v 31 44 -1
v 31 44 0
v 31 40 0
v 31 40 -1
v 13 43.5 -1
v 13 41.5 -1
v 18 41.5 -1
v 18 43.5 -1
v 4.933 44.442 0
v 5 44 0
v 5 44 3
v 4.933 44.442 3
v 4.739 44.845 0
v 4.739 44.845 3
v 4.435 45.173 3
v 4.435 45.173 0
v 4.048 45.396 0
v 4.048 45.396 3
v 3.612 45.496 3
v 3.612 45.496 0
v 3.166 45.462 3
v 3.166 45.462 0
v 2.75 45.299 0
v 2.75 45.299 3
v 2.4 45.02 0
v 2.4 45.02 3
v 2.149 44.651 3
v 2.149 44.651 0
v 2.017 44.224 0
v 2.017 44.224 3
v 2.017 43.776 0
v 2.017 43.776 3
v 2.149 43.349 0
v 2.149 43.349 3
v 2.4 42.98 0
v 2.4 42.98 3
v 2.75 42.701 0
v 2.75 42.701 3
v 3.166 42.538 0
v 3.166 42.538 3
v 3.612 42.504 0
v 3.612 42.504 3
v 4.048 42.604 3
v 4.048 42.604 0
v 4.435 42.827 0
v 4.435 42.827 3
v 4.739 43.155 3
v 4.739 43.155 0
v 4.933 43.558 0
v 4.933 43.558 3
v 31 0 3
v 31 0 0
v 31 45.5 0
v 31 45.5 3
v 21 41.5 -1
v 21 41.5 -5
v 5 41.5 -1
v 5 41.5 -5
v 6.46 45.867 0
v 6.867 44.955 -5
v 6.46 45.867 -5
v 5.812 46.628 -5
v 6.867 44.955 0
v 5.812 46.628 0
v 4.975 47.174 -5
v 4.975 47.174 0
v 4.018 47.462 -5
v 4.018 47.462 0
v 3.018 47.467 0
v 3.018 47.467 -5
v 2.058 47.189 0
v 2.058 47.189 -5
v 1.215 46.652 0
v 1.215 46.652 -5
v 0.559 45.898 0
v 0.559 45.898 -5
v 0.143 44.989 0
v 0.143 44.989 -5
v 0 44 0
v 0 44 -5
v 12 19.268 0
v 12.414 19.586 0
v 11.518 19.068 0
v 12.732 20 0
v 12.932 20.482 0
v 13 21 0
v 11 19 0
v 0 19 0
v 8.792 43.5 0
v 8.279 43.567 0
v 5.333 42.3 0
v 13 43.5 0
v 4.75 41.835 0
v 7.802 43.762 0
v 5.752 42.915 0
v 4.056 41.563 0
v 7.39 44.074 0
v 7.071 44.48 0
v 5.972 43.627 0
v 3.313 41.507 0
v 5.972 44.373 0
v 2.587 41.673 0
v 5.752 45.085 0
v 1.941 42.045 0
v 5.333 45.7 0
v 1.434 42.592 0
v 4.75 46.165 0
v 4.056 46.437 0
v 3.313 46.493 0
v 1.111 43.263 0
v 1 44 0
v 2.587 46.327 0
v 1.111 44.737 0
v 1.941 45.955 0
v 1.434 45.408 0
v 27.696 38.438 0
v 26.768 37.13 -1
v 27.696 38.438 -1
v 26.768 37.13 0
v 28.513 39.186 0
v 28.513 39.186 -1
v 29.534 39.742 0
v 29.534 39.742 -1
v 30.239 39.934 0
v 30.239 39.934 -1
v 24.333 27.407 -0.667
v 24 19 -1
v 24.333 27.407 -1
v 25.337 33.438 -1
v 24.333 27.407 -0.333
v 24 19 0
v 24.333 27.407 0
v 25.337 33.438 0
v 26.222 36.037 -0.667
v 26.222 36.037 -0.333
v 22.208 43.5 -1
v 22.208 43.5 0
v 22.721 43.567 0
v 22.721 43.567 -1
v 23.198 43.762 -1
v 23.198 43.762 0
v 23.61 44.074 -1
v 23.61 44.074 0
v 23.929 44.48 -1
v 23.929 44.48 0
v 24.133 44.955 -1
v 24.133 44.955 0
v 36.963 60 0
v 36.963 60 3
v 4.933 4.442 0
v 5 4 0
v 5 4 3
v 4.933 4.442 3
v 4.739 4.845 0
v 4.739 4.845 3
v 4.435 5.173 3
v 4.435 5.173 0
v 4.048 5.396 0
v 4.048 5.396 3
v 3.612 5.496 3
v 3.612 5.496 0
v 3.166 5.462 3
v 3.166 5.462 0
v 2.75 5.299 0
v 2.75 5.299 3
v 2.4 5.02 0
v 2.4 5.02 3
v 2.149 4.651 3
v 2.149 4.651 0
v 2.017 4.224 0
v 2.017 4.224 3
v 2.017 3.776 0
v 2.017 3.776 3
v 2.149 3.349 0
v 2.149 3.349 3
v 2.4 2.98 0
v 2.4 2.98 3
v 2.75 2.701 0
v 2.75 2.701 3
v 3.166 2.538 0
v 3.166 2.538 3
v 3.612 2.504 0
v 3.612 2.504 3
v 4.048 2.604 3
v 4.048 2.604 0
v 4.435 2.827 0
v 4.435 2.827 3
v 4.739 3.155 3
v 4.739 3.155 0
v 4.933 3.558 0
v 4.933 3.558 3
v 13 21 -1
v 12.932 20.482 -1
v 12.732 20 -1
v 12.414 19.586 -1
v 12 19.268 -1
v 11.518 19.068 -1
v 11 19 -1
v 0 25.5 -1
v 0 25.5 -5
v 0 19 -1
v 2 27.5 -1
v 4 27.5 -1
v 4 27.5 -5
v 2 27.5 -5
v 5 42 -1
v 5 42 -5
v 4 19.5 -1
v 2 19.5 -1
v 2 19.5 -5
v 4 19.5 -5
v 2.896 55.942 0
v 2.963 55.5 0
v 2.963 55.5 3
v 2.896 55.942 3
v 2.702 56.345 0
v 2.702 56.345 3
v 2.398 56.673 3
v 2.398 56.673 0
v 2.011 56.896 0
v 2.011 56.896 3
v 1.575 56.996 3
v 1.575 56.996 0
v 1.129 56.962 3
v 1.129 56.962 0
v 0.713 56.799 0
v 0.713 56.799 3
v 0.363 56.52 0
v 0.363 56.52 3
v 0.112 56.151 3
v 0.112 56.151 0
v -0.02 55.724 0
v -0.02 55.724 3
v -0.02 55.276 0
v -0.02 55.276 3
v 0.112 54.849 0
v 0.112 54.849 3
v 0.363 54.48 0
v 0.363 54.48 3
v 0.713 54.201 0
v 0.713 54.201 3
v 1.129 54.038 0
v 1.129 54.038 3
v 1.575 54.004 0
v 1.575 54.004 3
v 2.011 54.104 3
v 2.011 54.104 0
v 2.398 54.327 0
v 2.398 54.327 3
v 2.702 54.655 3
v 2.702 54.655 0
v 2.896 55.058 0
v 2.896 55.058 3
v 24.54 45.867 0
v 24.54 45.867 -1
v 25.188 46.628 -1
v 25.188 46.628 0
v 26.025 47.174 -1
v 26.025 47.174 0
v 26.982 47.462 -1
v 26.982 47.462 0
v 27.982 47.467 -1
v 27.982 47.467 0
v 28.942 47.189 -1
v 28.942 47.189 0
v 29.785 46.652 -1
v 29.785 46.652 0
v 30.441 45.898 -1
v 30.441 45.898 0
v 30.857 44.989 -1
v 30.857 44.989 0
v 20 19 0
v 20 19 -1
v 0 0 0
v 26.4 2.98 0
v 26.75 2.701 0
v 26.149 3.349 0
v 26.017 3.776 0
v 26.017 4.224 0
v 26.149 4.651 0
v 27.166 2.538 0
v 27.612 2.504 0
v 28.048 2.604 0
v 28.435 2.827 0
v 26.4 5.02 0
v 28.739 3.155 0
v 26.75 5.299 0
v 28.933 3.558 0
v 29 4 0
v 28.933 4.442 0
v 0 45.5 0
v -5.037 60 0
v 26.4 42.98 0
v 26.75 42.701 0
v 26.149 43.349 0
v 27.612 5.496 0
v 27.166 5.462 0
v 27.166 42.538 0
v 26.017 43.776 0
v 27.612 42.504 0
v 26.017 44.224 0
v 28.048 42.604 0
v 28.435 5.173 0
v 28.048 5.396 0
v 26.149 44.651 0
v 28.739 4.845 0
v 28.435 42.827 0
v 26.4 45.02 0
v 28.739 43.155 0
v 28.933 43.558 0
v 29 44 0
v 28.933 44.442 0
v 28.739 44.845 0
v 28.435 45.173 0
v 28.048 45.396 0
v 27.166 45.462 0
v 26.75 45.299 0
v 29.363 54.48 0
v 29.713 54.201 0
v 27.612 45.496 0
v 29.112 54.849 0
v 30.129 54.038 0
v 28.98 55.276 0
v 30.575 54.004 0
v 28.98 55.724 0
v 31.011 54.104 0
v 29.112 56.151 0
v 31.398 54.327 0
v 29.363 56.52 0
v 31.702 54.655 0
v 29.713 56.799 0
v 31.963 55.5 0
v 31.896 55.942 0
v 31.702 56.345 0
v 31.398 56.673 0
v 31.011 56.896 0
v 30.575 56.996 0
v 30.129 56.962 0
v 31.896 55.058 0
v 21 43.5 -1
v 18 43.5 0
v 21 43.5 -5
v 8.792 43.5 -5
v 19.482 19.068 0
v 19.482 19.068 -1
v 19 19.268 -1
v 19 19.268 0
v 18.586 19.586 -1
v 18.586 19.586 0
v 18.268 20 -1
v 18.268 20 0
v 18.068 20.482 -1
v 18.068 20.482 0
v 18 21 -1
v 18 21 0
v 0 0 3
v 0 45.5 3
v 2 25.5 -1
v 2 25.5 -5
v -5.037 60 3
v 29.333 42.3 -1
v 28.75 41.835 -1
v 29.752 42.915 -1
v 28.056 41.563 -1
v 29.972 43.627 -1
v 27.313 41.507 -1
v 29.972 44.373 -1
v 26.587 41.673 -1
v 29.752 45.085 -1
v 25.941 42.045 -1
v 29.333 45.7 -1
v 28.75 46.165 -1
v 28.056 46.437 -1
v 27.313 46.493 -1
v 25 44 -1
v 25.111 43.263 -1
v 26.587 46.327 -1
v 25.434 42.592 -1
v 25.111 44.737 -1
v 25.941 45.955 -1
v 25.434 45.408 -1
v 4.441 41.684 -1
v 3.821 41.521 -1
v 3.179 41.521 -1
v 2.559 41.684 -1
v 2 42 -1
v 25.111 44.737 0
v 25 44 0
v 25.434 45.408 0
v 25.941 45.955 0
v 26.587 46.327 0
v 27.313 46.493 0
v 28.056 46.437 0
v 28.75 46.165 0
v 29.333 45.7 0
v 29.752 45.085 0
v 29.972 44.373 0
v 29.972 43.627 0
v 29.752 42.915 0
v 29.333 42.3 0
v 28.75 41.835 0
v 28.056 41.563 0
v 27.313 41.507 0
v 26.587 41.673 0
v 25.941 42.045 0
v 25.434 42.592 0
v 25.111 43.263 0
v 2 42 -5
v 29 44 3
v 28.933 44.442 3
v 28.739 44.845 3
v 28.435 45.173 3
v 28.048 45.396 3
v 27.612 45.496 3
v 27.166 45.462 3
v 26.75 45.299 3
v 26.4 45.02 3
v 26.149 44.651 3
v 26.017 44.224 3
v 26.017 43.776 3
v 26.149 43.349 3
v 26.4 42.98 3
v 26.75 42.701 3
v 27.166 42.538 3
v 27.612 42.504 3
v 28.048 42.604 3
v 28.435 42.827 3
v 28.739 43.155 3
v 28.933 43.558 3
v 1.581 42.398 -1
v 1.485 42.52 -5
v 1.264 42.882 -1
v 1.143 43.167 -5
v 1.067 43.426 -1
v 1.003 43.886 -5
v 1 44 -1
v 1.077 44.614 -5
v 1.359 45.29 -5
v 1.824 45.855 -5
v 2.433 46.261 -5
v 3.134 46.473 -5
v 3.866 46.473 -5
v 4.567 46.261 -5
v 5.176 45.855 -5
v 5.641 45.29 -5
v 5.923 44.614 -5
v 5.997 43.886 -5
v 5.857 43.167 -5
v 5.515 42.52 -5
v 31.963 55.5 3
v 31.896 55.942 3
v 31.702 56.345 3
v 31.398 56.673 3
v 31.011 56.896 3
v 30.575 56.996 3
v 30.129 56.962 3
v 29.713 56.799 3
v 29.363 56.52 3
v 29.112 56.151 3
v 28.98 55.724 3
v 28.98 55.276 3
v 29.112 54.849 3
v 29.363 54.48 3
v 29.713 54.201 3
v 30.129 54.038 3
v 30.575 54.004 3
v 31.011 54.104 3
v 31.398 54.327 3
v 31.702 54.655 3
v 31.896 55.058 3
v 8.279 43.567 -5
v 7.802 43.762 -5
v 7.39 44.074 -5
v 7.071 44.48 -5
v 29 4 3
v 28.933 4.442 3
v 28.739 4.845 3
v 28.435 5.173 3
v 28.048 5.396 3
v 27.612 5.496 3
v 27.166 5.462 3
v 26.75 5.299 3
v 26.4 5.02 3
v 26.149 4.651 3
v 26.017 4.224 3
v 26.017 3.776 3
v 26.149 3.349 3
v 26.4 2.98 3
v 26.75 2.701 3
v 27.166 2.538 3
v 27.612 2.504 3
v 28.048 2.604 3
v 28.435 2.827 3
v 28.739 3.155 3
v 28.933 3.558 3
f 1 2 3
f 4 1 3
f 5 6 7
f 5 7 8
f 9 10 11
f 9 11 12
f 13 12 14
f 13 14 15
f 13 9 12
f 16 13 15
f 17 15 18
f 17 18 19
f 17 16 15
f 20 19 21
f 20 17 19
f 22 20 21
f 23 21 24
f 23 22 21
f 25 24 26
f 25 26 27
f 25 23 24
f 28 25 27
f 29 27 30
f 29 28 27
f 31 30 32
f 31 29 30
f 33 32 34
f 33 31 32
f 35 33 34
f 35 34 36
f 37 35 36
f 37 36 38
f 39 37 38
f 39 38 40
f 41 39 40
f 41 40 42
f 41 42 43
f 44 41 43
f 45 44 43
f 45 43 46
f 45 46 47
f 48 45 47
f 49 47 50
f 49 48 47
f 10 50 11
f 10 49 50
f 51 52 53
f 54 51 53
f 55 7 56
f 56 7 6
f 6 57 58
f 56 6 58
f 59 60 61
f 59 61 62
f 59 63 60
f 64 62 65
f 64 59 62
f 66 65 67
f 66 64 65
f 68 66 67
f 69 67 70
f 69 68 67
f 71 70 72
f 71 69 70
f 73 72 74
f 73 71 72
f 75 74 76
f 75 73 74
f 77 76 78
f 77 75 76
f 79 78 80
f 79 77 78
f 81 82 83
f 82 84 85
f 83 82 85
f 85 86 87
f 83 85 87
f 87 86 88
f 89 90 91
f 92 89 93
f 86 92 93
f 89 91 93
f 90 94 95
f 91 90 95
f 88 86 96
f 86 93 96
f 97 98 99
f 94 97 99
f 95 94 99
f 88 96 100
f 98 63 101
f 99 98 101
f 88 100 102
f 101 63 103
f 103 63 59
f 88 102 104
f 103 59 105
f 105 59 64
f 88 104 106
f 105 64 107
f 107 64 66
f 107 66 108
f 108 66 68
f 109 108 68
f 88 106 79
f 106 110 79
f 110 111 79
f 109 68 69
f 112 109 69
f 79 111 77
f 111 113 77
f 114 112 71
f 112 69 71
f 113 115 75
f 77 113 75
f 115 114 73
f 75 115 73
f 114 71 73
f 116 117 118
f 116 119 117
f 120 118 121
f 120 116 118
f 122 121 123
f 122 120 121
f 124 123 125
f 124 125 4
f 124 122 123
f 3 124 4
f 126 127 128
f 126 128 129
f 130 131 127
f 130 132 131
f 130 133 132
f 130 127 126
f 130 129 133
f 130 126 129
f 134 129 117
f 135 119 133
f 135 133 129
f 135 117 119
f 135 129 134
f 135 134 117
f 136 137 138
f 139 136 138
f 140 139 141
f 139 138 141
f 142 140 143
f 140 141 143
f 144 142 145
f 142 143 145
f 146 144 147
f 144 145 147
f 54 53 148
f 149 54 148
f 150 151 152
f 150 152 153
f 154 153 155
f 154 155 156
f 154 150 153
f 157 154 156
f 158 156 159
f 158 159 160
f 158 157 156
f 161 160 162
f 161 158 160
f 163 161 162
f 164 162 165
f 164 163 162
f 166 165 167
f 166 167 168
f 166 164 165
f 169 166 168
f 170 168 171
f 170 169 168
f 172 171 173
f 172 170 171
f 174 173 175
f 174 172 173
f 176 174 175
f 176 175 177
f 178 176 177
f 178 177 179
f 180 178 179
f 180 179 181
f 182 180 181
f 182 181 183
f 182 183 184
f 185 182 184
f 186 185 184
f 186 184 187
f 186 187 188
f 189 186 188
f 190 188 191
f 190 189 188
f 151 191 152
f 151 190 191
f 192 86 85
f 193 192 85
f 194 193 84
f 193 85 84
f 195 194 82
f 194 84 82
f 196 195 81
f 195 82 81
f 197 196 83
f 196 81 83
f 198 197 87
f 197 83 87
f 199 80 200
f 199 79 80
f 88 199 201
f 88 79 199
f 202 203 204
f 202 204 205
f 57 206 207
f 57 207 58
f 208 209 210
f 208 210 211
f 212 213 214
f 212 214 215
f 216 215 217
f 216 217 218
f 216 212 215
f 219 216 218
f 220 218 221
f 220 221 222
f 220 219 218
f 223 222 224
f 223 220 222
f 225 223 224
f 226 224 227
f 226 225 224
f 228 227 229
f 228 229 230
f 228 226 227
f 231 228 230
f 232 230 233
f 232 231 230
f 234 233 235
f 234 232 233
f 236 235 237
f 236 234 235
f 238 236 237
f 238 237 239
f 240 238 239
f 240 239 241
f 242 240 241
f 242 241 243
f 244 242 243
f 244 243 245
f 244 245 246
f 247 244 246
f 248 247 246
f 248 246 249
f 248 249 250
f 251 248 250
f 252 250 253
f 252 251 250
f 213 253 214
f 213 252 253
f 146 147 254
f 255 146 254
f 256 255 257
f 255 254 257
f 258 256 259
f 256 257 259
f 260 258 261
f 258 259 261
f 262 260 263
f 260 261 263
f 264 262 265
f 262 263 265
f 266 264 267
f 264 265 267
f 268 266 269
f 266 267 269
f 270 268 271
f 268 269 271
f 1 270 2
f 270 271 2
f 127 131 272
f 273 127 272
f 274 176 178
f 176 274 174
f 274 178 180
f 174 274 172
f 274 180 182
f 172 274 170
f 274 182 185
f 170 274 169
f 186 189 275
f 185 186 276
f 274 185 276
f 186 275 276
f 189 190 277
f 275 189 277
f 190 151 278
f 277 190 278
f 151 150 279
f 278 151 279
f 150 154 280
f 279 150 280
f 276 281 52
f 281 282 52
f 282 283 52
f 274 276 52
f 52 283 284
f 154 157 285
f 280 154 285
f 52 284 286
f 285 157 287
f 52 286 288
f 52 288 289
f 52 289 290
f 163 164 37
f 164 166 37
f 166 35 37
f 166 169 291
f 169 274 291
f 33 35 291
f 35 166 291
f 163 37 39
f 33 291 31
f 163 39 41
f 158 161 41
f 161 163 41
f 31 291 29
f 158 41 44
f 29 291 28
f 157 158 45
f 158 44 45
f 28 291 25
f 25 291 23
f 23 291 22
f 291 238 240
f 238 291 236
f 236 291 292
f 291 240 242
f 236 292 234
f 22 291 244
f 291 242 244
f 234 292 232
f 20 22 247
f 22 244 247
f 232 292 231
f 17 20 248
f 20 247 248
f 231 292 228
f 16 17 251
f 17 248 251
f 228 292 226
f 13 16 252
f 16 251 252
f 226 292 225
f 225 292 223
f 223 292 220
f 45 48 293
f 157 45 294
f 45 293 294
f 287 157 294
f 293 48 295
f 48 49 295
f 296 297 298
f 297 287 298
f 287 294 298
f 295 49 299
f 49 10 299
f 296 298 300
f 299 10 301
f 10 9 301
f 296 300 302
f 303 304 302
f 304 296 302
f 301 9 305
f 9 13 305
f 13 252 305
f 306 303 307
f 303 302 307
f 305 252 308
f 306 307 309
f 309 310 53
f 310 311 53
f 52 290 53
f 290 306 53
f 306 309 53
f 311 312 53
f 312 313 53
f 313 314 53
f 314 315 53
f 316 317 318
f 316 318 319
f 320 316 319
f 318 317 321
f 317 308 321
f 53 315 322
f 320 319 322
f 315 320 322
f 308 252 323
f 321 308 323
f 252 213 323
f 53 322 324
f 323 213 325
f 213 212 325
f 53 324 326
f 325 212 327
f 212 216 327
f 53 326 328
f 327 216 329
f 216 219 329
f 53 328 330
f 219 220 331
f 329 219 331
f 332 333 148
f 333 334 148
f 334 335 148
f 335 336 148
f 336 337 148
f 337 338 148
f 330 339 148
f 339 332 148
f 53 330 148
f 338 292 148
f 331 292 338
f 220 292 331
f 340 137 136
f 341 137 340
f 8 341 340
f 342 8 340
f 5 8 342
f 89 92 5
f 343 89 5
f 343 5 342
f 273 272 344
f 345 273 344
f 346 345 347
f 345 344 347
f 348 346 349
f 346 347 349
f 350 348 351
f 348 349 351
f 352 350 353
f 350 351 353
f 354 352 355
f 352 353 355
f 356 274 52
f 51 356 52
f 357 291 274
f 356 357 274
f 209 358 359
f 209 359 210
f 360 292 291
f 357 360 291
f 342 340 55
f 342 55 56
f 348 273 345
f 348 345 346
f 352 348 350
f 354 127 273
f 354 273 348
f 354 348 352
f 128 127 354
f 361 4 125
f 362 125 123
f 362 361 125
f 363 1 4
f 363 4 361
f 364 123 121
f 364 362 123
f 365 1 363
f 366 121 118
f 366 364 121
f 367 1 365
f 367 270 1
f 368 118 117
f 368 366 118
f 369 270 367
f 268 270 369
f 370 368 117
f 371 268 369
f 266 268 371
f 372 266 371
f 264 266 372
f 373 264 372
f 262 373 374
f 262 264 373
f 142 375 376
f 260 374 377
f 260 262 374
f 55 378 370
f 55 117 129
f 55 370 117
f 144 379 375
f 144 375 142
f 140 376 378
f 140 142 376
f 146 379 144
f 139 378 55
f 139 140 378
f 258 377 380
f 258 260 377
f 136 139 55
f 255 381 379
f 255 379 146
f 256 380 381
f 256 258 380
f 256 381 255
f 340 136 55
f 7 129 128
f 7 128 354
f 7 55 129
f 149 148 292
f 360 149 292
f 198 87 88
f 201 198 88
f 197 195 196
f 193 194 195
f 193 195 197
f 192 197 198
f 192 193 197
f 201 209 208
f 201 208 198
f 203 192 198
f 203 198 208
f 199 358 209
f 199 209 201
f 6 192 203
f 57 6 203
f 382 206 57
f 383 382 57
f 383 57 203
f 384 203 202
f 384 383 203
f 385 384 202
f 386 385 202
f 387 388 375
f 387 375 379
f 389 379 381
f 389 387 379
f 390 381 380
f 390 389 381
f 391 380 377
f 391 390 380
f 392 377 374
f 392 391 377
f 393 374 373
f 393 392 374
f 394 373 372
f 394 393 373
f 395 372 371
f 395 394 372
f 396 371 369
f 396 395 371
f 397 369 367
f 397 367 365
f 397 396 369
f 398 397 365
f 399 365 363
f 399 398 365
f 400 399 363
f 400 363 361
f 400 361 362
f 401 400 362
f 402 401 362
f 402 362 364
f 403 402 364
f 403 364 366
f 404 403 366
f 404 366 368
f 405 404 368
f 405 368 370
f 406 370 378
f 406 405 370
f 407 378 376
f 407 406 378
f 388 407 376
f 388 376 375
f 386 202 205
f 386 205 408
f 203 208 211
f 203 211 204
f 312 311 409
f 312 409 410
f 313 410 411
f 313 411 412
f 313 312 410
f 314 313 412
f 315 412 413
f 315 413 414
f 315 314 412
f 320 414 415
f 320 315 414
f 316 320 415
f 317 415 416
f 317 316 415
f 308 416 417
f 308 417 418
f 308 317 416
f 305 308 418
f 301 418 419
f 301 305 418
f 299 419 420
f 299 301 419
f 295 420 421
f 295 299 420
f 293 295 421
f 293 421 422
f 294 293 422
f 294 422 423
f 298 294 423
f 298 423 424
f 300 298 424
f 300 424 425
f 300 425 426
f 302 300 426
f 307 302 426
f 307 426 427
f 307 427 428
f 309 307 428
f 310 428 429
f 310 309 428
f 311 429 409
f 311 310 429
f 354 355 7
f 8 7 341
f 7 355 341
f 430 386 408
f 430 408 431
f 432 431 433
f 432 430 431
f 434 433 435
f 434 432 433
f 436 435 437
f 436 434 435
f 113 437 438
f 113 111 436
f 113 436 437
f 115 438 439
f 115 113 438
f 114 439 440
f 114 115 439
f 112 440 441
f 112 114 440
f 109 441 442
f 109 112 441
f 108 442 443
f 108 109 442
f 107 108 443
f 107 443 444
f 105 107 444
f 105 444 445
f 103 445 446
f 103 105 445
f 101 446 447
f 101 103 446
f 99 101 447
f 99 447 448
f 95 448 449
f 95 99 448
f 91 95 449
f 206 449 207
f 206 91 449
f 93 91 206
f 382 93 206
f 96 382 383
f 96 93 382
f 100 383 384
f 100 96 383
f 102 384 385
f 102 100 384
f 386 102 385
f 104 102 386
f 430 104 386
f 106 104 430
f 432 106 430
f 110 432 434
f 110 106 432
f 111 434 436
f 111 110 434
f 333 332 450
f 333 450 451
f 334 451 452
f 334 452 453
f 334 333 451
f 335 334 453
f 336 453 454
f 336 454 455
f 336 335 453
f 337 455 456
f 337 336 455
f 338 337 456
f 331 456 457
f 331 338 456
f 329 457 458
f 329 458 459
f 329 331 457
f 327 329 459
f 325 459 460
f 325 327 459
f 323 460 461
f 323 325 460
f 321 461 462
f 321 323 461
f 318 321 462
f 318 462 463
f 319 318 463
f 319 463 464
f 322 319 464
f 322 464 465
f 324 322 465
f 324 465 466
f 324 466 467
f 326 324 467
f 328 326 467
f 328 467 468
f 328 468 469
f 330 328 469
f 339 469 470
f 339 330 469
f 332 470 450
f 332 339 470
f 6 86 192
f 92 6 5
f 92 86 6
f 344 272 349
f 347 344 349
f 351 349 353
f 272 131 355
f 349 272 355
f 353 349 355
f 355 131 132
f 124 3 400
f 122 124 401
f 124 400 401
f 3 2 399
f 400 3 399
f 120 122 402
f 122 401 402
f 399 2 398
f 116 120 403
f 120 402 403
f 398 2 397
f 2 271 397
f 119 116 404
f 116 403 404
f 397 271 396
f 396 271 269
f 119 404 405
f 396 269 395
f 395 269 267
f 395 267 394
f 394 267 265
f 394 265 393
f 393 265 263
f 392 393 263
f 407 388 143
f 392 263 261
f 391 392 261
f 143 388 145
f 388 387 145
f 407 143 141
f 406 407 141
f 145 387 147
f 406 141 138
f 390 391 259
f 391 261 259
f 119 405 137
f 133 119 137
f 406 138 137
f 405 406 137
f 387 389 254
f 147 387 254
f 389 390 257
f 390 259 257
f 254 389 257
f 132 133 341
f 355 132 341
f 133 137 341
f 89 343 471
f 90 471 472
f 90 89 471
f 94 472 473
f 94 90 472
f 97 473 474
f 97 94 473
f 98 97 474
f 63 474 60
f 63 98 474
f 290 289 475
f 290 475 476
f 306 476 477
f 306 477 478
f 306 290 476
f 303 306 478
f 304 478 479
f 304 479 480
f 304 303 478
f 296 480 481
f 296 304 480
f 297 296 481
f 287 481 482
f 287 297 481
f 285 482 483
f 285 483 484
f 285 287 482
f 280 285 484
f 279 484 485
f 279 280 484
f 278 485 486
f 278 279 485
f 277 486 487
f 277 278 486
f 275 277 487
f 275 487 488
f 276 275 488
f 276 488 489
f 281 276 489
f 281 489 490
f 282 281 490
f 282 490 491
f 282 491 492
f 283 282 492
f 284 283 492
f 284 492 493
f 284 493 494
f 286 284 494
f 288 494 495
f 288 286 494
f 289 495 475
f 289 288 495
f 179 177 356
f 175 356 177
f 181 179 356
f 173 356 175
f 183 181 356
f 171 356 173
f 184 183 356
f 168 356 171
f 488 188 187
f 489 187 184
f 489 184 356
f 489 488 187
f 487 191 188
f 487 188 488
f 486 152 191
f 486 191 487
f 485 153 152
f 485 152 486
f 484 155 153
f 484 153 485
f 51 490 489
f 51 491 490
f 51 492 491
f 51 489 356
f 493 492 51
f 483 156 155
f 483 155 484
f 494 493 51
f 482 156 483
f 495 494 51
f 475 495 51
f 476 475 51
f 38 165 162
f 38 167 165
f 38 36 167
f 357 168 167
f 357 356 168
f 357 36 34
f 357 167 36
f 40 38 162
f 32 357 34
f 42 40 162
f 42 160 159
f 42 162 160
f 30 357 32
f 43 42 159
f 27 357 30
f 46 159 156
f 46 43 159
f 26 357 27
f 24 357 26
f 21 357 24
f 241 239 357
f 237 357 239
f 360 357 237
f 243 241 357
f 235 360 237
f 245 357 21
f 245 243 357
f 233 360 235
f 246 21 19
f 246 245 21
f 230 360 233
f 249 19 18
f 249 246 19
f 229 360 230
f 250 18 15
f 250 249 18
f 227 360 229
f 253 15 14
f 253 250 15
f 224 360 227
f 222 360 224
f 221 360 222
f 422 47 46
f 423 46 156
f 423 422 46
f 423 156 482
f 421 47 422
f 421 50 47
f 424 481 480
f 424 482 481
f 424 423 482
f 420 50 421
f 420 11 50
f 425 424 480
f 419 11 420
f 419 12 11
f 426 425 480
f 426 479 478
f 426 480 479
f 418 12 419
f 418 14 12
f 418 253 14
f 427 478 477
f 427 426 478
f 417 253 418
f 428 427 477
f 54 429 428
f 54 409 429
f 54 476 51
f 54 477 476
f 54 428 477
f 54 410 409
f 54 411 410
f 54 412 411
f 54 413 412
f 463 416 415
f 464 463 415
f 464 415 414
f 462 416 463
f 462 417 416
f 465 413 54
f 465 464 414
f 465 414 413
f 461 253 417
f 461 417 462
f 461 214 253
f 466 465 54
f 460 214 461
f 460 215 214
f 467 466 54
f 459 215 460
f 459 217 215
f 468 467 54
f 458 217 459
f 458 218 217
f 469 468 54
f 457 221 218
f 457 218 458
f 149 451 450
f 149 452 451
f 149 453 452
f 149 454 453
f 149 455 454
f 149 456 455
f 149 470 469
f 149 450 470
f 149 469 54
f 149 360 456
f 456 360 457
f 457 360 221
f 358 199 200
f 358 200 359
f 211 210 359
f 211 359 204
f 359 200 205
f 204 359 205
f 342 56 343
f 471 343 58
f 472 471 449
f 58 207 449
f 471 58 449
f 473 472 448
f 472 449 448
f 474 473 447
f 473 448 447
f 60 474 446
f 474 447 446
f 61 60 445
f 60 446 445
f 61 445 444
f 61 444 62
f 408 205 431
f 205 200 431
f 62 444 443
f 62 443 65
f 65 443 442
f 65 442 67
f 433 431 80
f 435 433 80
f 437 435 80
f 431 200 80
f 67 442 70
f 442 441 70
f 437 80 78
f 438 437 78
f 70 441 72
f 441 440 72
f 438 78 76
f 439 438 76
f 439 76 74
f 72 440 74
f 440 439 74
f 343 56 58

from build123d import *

# Parameters (mm, degrees)
SKETCH1_R             = 1.5
BOSS_EXTRUDE1_DEPTH   = 3
SKETCH2_R             = 2.5
BOSS_EXTRUDE2_DEPTH   = 1
BOSS_EXTRUDE2_2_DEPTH = 1
BOSS_EXTRUDE3_DEPTH   = 4
SKETCH4_W             = 4
SKETCH4_H             = 2
BOSS_EXTRUDE4_DEPTH   = 8


with BuildPart() as part:
    # Sketch1 → Boss-Extrude1 (new body)
    with BuildSketch(Plane.XY):
        Polygon((0, 0), (31, 0), (31, 45.5), (36.963007518, 60), (-5.036992482, 60), (0, 45.5), align=None)
        with Locations((30.463007518, 55.5)):
            Circle(SKETCH1_R, mode=Mode.SUBTRACT)
        with Locations((27.5, 44)):
            Circle(SKETCH1_R, mode=Mode.SUBTRACT)
        with Locations((27.5, 4)):
            Circle(SKETCH1_R, mode=Mode.SUBTRACT)
        with Locations((3.5, 4)):
            Circle(SKETCH1_R, mode=Mode.SUBTRACT)
        with Locations((3.5, 44)):
            Circle(SKETCH1_R, mode=Mode.SUBTRACT)
        with Locations((1.463007518, 55.5)):
            Circle(SKETCH1_R, mode=Mode.SUBTRACT)
    extrude(amount=BOSS_EXTRUDE1_DEPTH)


with BuildPart() as body_2:
    # Sketch2 → Boss-Extrude2 (new body)
    with BuildSketch(Plane(origin=(0, 0, 0), x_dir=(-1, 0, 0), z_dir=(0, 0, -1))):
        with BuildLine():
            Line((0, 19), (0, 44))
            ThreePointArc((0, 44), (-3.018138753, 47.466671276), (-6.86731985, 44.954545455))
            ThreePointArc((-6.86731985, 44.954545455), (-7.585457244, 43.90455193), (-8.791502622, 43.5))
            Line((-8.791502622, 43.5), (-13, 43.5))
            Line((-13, 43.5), (-13, 21))
            ThreePointArc((-13, 21), (-12.414213562, 19.585786438), (-11, 19))
            Line((-11, 19), (0, 19))
        make_face()
        with Locations((-3.5, 44)):
            Circle(SKETCH2_R, mode=Mode.SUBTRACT)
    extrude(amount=BOSS_EXTRUDE2_DEPTH)

    # Sketch3 → Boss-Extrude3 (add)
    with BuildSketch(Plane(origin=(0, 0, -1), x_dir=(-1, 0, 0), z_dir=(0, 0, -1))):
        with BuildLine():
            Line((0, 44), (0, 25.5))
            Line((0, 25.5), (-2, 25.5))
            Line((-2, 25.5), (-2, 19.5))
            Line((-2, 19.5), (-4, 19.5))
            Line((-4, 19.5), (-4, 27.5))
            Line((-4, 27.5), (-2, 27.5))
            Line((-2, 27.5), (-2, 42))
            ThreePointArc((-2, 42), (-3.5, 46.5), (-5, 42))
            Line((-5, 42), (-5, 41.5))
            Line((-5, 41.5), (-13, 41.5))
            Line((-13, 41.5), (-13, 43.5))
            Line((-13, 43.5), (-8.791502622, 43.5))
            ThreePointArc((-8.791502622, 43.5), (-7.585457244, 43.90455193), (-6.86731985, 44.954545455))
            ThreePointArc((-6.86731985, 44.954545455), (-3.018138753, 47.466671276), (0, 44))
        make_face()
    extrude(amount=BOSS_EXTRUDE3_DEPTH)



with BuildPart() as body_3:
    # Sketch2 → Boss-Extrude2 2 (new body)
    with BuildSketch(Plane(origin=(0, 0, 0), x_dir=(-1, 0, 0), z_dir=(0, 0, -1))):
        with BuildLine():
            Line((-18, 21), (-18, 43.5))
            Line((-18, 43.5), (-22.208497378, 43.5))
            ThreePointArc((-22.208497378, 43.5), (-23.414542756, 43.90455193), (-24.13268015, 44.954545455))
            ThreePointArc((-24.13268015, 44.954545455), (-27.981861247, 47.466671276), (-31, 44))
            Line((-31, 44), (-31, 40))
            add(Edge.make_bspline(
                [(-24, 19), (-24, 25.666666667), (-24.333333333, 40), (-31, 40)],
                knots=[0, 0, 0, 0, 1, 1, 1, 1], degree=3))
            Line((-24, 19), (-20, 19))
            ThreePointArc((-20, 19), (-18.585786438, 19.585786438), (-18, 21))
        make_face()
        with Locations((-27.5, 44)):
            Circle(SKETCH2_R, mode=Mode.SUBTRACT)
    extrude(amount=BOSS_EXTRUDE2_2_DEPTH)


with BuildPart() as body_2_1:
    add(body_2.part)

    add(body_3.part)  # Boss-Extrude4 merges body 3
    # Sketch4 → Boss-Extrude4 (add)
    with BuildSketch(Plane(origin=(13, 0, 0), x_dir=(0, 0, -1), z_dir=(1, 0, 0))):
        with Locations((3, 42.5)):
            Rectangle(SKETCH4_W, SKETCH4_H)
    extrude(amount=BOSS_EXTRUDE4_DEPTH)


solid = Compound([part.part, body_2_1.part])
